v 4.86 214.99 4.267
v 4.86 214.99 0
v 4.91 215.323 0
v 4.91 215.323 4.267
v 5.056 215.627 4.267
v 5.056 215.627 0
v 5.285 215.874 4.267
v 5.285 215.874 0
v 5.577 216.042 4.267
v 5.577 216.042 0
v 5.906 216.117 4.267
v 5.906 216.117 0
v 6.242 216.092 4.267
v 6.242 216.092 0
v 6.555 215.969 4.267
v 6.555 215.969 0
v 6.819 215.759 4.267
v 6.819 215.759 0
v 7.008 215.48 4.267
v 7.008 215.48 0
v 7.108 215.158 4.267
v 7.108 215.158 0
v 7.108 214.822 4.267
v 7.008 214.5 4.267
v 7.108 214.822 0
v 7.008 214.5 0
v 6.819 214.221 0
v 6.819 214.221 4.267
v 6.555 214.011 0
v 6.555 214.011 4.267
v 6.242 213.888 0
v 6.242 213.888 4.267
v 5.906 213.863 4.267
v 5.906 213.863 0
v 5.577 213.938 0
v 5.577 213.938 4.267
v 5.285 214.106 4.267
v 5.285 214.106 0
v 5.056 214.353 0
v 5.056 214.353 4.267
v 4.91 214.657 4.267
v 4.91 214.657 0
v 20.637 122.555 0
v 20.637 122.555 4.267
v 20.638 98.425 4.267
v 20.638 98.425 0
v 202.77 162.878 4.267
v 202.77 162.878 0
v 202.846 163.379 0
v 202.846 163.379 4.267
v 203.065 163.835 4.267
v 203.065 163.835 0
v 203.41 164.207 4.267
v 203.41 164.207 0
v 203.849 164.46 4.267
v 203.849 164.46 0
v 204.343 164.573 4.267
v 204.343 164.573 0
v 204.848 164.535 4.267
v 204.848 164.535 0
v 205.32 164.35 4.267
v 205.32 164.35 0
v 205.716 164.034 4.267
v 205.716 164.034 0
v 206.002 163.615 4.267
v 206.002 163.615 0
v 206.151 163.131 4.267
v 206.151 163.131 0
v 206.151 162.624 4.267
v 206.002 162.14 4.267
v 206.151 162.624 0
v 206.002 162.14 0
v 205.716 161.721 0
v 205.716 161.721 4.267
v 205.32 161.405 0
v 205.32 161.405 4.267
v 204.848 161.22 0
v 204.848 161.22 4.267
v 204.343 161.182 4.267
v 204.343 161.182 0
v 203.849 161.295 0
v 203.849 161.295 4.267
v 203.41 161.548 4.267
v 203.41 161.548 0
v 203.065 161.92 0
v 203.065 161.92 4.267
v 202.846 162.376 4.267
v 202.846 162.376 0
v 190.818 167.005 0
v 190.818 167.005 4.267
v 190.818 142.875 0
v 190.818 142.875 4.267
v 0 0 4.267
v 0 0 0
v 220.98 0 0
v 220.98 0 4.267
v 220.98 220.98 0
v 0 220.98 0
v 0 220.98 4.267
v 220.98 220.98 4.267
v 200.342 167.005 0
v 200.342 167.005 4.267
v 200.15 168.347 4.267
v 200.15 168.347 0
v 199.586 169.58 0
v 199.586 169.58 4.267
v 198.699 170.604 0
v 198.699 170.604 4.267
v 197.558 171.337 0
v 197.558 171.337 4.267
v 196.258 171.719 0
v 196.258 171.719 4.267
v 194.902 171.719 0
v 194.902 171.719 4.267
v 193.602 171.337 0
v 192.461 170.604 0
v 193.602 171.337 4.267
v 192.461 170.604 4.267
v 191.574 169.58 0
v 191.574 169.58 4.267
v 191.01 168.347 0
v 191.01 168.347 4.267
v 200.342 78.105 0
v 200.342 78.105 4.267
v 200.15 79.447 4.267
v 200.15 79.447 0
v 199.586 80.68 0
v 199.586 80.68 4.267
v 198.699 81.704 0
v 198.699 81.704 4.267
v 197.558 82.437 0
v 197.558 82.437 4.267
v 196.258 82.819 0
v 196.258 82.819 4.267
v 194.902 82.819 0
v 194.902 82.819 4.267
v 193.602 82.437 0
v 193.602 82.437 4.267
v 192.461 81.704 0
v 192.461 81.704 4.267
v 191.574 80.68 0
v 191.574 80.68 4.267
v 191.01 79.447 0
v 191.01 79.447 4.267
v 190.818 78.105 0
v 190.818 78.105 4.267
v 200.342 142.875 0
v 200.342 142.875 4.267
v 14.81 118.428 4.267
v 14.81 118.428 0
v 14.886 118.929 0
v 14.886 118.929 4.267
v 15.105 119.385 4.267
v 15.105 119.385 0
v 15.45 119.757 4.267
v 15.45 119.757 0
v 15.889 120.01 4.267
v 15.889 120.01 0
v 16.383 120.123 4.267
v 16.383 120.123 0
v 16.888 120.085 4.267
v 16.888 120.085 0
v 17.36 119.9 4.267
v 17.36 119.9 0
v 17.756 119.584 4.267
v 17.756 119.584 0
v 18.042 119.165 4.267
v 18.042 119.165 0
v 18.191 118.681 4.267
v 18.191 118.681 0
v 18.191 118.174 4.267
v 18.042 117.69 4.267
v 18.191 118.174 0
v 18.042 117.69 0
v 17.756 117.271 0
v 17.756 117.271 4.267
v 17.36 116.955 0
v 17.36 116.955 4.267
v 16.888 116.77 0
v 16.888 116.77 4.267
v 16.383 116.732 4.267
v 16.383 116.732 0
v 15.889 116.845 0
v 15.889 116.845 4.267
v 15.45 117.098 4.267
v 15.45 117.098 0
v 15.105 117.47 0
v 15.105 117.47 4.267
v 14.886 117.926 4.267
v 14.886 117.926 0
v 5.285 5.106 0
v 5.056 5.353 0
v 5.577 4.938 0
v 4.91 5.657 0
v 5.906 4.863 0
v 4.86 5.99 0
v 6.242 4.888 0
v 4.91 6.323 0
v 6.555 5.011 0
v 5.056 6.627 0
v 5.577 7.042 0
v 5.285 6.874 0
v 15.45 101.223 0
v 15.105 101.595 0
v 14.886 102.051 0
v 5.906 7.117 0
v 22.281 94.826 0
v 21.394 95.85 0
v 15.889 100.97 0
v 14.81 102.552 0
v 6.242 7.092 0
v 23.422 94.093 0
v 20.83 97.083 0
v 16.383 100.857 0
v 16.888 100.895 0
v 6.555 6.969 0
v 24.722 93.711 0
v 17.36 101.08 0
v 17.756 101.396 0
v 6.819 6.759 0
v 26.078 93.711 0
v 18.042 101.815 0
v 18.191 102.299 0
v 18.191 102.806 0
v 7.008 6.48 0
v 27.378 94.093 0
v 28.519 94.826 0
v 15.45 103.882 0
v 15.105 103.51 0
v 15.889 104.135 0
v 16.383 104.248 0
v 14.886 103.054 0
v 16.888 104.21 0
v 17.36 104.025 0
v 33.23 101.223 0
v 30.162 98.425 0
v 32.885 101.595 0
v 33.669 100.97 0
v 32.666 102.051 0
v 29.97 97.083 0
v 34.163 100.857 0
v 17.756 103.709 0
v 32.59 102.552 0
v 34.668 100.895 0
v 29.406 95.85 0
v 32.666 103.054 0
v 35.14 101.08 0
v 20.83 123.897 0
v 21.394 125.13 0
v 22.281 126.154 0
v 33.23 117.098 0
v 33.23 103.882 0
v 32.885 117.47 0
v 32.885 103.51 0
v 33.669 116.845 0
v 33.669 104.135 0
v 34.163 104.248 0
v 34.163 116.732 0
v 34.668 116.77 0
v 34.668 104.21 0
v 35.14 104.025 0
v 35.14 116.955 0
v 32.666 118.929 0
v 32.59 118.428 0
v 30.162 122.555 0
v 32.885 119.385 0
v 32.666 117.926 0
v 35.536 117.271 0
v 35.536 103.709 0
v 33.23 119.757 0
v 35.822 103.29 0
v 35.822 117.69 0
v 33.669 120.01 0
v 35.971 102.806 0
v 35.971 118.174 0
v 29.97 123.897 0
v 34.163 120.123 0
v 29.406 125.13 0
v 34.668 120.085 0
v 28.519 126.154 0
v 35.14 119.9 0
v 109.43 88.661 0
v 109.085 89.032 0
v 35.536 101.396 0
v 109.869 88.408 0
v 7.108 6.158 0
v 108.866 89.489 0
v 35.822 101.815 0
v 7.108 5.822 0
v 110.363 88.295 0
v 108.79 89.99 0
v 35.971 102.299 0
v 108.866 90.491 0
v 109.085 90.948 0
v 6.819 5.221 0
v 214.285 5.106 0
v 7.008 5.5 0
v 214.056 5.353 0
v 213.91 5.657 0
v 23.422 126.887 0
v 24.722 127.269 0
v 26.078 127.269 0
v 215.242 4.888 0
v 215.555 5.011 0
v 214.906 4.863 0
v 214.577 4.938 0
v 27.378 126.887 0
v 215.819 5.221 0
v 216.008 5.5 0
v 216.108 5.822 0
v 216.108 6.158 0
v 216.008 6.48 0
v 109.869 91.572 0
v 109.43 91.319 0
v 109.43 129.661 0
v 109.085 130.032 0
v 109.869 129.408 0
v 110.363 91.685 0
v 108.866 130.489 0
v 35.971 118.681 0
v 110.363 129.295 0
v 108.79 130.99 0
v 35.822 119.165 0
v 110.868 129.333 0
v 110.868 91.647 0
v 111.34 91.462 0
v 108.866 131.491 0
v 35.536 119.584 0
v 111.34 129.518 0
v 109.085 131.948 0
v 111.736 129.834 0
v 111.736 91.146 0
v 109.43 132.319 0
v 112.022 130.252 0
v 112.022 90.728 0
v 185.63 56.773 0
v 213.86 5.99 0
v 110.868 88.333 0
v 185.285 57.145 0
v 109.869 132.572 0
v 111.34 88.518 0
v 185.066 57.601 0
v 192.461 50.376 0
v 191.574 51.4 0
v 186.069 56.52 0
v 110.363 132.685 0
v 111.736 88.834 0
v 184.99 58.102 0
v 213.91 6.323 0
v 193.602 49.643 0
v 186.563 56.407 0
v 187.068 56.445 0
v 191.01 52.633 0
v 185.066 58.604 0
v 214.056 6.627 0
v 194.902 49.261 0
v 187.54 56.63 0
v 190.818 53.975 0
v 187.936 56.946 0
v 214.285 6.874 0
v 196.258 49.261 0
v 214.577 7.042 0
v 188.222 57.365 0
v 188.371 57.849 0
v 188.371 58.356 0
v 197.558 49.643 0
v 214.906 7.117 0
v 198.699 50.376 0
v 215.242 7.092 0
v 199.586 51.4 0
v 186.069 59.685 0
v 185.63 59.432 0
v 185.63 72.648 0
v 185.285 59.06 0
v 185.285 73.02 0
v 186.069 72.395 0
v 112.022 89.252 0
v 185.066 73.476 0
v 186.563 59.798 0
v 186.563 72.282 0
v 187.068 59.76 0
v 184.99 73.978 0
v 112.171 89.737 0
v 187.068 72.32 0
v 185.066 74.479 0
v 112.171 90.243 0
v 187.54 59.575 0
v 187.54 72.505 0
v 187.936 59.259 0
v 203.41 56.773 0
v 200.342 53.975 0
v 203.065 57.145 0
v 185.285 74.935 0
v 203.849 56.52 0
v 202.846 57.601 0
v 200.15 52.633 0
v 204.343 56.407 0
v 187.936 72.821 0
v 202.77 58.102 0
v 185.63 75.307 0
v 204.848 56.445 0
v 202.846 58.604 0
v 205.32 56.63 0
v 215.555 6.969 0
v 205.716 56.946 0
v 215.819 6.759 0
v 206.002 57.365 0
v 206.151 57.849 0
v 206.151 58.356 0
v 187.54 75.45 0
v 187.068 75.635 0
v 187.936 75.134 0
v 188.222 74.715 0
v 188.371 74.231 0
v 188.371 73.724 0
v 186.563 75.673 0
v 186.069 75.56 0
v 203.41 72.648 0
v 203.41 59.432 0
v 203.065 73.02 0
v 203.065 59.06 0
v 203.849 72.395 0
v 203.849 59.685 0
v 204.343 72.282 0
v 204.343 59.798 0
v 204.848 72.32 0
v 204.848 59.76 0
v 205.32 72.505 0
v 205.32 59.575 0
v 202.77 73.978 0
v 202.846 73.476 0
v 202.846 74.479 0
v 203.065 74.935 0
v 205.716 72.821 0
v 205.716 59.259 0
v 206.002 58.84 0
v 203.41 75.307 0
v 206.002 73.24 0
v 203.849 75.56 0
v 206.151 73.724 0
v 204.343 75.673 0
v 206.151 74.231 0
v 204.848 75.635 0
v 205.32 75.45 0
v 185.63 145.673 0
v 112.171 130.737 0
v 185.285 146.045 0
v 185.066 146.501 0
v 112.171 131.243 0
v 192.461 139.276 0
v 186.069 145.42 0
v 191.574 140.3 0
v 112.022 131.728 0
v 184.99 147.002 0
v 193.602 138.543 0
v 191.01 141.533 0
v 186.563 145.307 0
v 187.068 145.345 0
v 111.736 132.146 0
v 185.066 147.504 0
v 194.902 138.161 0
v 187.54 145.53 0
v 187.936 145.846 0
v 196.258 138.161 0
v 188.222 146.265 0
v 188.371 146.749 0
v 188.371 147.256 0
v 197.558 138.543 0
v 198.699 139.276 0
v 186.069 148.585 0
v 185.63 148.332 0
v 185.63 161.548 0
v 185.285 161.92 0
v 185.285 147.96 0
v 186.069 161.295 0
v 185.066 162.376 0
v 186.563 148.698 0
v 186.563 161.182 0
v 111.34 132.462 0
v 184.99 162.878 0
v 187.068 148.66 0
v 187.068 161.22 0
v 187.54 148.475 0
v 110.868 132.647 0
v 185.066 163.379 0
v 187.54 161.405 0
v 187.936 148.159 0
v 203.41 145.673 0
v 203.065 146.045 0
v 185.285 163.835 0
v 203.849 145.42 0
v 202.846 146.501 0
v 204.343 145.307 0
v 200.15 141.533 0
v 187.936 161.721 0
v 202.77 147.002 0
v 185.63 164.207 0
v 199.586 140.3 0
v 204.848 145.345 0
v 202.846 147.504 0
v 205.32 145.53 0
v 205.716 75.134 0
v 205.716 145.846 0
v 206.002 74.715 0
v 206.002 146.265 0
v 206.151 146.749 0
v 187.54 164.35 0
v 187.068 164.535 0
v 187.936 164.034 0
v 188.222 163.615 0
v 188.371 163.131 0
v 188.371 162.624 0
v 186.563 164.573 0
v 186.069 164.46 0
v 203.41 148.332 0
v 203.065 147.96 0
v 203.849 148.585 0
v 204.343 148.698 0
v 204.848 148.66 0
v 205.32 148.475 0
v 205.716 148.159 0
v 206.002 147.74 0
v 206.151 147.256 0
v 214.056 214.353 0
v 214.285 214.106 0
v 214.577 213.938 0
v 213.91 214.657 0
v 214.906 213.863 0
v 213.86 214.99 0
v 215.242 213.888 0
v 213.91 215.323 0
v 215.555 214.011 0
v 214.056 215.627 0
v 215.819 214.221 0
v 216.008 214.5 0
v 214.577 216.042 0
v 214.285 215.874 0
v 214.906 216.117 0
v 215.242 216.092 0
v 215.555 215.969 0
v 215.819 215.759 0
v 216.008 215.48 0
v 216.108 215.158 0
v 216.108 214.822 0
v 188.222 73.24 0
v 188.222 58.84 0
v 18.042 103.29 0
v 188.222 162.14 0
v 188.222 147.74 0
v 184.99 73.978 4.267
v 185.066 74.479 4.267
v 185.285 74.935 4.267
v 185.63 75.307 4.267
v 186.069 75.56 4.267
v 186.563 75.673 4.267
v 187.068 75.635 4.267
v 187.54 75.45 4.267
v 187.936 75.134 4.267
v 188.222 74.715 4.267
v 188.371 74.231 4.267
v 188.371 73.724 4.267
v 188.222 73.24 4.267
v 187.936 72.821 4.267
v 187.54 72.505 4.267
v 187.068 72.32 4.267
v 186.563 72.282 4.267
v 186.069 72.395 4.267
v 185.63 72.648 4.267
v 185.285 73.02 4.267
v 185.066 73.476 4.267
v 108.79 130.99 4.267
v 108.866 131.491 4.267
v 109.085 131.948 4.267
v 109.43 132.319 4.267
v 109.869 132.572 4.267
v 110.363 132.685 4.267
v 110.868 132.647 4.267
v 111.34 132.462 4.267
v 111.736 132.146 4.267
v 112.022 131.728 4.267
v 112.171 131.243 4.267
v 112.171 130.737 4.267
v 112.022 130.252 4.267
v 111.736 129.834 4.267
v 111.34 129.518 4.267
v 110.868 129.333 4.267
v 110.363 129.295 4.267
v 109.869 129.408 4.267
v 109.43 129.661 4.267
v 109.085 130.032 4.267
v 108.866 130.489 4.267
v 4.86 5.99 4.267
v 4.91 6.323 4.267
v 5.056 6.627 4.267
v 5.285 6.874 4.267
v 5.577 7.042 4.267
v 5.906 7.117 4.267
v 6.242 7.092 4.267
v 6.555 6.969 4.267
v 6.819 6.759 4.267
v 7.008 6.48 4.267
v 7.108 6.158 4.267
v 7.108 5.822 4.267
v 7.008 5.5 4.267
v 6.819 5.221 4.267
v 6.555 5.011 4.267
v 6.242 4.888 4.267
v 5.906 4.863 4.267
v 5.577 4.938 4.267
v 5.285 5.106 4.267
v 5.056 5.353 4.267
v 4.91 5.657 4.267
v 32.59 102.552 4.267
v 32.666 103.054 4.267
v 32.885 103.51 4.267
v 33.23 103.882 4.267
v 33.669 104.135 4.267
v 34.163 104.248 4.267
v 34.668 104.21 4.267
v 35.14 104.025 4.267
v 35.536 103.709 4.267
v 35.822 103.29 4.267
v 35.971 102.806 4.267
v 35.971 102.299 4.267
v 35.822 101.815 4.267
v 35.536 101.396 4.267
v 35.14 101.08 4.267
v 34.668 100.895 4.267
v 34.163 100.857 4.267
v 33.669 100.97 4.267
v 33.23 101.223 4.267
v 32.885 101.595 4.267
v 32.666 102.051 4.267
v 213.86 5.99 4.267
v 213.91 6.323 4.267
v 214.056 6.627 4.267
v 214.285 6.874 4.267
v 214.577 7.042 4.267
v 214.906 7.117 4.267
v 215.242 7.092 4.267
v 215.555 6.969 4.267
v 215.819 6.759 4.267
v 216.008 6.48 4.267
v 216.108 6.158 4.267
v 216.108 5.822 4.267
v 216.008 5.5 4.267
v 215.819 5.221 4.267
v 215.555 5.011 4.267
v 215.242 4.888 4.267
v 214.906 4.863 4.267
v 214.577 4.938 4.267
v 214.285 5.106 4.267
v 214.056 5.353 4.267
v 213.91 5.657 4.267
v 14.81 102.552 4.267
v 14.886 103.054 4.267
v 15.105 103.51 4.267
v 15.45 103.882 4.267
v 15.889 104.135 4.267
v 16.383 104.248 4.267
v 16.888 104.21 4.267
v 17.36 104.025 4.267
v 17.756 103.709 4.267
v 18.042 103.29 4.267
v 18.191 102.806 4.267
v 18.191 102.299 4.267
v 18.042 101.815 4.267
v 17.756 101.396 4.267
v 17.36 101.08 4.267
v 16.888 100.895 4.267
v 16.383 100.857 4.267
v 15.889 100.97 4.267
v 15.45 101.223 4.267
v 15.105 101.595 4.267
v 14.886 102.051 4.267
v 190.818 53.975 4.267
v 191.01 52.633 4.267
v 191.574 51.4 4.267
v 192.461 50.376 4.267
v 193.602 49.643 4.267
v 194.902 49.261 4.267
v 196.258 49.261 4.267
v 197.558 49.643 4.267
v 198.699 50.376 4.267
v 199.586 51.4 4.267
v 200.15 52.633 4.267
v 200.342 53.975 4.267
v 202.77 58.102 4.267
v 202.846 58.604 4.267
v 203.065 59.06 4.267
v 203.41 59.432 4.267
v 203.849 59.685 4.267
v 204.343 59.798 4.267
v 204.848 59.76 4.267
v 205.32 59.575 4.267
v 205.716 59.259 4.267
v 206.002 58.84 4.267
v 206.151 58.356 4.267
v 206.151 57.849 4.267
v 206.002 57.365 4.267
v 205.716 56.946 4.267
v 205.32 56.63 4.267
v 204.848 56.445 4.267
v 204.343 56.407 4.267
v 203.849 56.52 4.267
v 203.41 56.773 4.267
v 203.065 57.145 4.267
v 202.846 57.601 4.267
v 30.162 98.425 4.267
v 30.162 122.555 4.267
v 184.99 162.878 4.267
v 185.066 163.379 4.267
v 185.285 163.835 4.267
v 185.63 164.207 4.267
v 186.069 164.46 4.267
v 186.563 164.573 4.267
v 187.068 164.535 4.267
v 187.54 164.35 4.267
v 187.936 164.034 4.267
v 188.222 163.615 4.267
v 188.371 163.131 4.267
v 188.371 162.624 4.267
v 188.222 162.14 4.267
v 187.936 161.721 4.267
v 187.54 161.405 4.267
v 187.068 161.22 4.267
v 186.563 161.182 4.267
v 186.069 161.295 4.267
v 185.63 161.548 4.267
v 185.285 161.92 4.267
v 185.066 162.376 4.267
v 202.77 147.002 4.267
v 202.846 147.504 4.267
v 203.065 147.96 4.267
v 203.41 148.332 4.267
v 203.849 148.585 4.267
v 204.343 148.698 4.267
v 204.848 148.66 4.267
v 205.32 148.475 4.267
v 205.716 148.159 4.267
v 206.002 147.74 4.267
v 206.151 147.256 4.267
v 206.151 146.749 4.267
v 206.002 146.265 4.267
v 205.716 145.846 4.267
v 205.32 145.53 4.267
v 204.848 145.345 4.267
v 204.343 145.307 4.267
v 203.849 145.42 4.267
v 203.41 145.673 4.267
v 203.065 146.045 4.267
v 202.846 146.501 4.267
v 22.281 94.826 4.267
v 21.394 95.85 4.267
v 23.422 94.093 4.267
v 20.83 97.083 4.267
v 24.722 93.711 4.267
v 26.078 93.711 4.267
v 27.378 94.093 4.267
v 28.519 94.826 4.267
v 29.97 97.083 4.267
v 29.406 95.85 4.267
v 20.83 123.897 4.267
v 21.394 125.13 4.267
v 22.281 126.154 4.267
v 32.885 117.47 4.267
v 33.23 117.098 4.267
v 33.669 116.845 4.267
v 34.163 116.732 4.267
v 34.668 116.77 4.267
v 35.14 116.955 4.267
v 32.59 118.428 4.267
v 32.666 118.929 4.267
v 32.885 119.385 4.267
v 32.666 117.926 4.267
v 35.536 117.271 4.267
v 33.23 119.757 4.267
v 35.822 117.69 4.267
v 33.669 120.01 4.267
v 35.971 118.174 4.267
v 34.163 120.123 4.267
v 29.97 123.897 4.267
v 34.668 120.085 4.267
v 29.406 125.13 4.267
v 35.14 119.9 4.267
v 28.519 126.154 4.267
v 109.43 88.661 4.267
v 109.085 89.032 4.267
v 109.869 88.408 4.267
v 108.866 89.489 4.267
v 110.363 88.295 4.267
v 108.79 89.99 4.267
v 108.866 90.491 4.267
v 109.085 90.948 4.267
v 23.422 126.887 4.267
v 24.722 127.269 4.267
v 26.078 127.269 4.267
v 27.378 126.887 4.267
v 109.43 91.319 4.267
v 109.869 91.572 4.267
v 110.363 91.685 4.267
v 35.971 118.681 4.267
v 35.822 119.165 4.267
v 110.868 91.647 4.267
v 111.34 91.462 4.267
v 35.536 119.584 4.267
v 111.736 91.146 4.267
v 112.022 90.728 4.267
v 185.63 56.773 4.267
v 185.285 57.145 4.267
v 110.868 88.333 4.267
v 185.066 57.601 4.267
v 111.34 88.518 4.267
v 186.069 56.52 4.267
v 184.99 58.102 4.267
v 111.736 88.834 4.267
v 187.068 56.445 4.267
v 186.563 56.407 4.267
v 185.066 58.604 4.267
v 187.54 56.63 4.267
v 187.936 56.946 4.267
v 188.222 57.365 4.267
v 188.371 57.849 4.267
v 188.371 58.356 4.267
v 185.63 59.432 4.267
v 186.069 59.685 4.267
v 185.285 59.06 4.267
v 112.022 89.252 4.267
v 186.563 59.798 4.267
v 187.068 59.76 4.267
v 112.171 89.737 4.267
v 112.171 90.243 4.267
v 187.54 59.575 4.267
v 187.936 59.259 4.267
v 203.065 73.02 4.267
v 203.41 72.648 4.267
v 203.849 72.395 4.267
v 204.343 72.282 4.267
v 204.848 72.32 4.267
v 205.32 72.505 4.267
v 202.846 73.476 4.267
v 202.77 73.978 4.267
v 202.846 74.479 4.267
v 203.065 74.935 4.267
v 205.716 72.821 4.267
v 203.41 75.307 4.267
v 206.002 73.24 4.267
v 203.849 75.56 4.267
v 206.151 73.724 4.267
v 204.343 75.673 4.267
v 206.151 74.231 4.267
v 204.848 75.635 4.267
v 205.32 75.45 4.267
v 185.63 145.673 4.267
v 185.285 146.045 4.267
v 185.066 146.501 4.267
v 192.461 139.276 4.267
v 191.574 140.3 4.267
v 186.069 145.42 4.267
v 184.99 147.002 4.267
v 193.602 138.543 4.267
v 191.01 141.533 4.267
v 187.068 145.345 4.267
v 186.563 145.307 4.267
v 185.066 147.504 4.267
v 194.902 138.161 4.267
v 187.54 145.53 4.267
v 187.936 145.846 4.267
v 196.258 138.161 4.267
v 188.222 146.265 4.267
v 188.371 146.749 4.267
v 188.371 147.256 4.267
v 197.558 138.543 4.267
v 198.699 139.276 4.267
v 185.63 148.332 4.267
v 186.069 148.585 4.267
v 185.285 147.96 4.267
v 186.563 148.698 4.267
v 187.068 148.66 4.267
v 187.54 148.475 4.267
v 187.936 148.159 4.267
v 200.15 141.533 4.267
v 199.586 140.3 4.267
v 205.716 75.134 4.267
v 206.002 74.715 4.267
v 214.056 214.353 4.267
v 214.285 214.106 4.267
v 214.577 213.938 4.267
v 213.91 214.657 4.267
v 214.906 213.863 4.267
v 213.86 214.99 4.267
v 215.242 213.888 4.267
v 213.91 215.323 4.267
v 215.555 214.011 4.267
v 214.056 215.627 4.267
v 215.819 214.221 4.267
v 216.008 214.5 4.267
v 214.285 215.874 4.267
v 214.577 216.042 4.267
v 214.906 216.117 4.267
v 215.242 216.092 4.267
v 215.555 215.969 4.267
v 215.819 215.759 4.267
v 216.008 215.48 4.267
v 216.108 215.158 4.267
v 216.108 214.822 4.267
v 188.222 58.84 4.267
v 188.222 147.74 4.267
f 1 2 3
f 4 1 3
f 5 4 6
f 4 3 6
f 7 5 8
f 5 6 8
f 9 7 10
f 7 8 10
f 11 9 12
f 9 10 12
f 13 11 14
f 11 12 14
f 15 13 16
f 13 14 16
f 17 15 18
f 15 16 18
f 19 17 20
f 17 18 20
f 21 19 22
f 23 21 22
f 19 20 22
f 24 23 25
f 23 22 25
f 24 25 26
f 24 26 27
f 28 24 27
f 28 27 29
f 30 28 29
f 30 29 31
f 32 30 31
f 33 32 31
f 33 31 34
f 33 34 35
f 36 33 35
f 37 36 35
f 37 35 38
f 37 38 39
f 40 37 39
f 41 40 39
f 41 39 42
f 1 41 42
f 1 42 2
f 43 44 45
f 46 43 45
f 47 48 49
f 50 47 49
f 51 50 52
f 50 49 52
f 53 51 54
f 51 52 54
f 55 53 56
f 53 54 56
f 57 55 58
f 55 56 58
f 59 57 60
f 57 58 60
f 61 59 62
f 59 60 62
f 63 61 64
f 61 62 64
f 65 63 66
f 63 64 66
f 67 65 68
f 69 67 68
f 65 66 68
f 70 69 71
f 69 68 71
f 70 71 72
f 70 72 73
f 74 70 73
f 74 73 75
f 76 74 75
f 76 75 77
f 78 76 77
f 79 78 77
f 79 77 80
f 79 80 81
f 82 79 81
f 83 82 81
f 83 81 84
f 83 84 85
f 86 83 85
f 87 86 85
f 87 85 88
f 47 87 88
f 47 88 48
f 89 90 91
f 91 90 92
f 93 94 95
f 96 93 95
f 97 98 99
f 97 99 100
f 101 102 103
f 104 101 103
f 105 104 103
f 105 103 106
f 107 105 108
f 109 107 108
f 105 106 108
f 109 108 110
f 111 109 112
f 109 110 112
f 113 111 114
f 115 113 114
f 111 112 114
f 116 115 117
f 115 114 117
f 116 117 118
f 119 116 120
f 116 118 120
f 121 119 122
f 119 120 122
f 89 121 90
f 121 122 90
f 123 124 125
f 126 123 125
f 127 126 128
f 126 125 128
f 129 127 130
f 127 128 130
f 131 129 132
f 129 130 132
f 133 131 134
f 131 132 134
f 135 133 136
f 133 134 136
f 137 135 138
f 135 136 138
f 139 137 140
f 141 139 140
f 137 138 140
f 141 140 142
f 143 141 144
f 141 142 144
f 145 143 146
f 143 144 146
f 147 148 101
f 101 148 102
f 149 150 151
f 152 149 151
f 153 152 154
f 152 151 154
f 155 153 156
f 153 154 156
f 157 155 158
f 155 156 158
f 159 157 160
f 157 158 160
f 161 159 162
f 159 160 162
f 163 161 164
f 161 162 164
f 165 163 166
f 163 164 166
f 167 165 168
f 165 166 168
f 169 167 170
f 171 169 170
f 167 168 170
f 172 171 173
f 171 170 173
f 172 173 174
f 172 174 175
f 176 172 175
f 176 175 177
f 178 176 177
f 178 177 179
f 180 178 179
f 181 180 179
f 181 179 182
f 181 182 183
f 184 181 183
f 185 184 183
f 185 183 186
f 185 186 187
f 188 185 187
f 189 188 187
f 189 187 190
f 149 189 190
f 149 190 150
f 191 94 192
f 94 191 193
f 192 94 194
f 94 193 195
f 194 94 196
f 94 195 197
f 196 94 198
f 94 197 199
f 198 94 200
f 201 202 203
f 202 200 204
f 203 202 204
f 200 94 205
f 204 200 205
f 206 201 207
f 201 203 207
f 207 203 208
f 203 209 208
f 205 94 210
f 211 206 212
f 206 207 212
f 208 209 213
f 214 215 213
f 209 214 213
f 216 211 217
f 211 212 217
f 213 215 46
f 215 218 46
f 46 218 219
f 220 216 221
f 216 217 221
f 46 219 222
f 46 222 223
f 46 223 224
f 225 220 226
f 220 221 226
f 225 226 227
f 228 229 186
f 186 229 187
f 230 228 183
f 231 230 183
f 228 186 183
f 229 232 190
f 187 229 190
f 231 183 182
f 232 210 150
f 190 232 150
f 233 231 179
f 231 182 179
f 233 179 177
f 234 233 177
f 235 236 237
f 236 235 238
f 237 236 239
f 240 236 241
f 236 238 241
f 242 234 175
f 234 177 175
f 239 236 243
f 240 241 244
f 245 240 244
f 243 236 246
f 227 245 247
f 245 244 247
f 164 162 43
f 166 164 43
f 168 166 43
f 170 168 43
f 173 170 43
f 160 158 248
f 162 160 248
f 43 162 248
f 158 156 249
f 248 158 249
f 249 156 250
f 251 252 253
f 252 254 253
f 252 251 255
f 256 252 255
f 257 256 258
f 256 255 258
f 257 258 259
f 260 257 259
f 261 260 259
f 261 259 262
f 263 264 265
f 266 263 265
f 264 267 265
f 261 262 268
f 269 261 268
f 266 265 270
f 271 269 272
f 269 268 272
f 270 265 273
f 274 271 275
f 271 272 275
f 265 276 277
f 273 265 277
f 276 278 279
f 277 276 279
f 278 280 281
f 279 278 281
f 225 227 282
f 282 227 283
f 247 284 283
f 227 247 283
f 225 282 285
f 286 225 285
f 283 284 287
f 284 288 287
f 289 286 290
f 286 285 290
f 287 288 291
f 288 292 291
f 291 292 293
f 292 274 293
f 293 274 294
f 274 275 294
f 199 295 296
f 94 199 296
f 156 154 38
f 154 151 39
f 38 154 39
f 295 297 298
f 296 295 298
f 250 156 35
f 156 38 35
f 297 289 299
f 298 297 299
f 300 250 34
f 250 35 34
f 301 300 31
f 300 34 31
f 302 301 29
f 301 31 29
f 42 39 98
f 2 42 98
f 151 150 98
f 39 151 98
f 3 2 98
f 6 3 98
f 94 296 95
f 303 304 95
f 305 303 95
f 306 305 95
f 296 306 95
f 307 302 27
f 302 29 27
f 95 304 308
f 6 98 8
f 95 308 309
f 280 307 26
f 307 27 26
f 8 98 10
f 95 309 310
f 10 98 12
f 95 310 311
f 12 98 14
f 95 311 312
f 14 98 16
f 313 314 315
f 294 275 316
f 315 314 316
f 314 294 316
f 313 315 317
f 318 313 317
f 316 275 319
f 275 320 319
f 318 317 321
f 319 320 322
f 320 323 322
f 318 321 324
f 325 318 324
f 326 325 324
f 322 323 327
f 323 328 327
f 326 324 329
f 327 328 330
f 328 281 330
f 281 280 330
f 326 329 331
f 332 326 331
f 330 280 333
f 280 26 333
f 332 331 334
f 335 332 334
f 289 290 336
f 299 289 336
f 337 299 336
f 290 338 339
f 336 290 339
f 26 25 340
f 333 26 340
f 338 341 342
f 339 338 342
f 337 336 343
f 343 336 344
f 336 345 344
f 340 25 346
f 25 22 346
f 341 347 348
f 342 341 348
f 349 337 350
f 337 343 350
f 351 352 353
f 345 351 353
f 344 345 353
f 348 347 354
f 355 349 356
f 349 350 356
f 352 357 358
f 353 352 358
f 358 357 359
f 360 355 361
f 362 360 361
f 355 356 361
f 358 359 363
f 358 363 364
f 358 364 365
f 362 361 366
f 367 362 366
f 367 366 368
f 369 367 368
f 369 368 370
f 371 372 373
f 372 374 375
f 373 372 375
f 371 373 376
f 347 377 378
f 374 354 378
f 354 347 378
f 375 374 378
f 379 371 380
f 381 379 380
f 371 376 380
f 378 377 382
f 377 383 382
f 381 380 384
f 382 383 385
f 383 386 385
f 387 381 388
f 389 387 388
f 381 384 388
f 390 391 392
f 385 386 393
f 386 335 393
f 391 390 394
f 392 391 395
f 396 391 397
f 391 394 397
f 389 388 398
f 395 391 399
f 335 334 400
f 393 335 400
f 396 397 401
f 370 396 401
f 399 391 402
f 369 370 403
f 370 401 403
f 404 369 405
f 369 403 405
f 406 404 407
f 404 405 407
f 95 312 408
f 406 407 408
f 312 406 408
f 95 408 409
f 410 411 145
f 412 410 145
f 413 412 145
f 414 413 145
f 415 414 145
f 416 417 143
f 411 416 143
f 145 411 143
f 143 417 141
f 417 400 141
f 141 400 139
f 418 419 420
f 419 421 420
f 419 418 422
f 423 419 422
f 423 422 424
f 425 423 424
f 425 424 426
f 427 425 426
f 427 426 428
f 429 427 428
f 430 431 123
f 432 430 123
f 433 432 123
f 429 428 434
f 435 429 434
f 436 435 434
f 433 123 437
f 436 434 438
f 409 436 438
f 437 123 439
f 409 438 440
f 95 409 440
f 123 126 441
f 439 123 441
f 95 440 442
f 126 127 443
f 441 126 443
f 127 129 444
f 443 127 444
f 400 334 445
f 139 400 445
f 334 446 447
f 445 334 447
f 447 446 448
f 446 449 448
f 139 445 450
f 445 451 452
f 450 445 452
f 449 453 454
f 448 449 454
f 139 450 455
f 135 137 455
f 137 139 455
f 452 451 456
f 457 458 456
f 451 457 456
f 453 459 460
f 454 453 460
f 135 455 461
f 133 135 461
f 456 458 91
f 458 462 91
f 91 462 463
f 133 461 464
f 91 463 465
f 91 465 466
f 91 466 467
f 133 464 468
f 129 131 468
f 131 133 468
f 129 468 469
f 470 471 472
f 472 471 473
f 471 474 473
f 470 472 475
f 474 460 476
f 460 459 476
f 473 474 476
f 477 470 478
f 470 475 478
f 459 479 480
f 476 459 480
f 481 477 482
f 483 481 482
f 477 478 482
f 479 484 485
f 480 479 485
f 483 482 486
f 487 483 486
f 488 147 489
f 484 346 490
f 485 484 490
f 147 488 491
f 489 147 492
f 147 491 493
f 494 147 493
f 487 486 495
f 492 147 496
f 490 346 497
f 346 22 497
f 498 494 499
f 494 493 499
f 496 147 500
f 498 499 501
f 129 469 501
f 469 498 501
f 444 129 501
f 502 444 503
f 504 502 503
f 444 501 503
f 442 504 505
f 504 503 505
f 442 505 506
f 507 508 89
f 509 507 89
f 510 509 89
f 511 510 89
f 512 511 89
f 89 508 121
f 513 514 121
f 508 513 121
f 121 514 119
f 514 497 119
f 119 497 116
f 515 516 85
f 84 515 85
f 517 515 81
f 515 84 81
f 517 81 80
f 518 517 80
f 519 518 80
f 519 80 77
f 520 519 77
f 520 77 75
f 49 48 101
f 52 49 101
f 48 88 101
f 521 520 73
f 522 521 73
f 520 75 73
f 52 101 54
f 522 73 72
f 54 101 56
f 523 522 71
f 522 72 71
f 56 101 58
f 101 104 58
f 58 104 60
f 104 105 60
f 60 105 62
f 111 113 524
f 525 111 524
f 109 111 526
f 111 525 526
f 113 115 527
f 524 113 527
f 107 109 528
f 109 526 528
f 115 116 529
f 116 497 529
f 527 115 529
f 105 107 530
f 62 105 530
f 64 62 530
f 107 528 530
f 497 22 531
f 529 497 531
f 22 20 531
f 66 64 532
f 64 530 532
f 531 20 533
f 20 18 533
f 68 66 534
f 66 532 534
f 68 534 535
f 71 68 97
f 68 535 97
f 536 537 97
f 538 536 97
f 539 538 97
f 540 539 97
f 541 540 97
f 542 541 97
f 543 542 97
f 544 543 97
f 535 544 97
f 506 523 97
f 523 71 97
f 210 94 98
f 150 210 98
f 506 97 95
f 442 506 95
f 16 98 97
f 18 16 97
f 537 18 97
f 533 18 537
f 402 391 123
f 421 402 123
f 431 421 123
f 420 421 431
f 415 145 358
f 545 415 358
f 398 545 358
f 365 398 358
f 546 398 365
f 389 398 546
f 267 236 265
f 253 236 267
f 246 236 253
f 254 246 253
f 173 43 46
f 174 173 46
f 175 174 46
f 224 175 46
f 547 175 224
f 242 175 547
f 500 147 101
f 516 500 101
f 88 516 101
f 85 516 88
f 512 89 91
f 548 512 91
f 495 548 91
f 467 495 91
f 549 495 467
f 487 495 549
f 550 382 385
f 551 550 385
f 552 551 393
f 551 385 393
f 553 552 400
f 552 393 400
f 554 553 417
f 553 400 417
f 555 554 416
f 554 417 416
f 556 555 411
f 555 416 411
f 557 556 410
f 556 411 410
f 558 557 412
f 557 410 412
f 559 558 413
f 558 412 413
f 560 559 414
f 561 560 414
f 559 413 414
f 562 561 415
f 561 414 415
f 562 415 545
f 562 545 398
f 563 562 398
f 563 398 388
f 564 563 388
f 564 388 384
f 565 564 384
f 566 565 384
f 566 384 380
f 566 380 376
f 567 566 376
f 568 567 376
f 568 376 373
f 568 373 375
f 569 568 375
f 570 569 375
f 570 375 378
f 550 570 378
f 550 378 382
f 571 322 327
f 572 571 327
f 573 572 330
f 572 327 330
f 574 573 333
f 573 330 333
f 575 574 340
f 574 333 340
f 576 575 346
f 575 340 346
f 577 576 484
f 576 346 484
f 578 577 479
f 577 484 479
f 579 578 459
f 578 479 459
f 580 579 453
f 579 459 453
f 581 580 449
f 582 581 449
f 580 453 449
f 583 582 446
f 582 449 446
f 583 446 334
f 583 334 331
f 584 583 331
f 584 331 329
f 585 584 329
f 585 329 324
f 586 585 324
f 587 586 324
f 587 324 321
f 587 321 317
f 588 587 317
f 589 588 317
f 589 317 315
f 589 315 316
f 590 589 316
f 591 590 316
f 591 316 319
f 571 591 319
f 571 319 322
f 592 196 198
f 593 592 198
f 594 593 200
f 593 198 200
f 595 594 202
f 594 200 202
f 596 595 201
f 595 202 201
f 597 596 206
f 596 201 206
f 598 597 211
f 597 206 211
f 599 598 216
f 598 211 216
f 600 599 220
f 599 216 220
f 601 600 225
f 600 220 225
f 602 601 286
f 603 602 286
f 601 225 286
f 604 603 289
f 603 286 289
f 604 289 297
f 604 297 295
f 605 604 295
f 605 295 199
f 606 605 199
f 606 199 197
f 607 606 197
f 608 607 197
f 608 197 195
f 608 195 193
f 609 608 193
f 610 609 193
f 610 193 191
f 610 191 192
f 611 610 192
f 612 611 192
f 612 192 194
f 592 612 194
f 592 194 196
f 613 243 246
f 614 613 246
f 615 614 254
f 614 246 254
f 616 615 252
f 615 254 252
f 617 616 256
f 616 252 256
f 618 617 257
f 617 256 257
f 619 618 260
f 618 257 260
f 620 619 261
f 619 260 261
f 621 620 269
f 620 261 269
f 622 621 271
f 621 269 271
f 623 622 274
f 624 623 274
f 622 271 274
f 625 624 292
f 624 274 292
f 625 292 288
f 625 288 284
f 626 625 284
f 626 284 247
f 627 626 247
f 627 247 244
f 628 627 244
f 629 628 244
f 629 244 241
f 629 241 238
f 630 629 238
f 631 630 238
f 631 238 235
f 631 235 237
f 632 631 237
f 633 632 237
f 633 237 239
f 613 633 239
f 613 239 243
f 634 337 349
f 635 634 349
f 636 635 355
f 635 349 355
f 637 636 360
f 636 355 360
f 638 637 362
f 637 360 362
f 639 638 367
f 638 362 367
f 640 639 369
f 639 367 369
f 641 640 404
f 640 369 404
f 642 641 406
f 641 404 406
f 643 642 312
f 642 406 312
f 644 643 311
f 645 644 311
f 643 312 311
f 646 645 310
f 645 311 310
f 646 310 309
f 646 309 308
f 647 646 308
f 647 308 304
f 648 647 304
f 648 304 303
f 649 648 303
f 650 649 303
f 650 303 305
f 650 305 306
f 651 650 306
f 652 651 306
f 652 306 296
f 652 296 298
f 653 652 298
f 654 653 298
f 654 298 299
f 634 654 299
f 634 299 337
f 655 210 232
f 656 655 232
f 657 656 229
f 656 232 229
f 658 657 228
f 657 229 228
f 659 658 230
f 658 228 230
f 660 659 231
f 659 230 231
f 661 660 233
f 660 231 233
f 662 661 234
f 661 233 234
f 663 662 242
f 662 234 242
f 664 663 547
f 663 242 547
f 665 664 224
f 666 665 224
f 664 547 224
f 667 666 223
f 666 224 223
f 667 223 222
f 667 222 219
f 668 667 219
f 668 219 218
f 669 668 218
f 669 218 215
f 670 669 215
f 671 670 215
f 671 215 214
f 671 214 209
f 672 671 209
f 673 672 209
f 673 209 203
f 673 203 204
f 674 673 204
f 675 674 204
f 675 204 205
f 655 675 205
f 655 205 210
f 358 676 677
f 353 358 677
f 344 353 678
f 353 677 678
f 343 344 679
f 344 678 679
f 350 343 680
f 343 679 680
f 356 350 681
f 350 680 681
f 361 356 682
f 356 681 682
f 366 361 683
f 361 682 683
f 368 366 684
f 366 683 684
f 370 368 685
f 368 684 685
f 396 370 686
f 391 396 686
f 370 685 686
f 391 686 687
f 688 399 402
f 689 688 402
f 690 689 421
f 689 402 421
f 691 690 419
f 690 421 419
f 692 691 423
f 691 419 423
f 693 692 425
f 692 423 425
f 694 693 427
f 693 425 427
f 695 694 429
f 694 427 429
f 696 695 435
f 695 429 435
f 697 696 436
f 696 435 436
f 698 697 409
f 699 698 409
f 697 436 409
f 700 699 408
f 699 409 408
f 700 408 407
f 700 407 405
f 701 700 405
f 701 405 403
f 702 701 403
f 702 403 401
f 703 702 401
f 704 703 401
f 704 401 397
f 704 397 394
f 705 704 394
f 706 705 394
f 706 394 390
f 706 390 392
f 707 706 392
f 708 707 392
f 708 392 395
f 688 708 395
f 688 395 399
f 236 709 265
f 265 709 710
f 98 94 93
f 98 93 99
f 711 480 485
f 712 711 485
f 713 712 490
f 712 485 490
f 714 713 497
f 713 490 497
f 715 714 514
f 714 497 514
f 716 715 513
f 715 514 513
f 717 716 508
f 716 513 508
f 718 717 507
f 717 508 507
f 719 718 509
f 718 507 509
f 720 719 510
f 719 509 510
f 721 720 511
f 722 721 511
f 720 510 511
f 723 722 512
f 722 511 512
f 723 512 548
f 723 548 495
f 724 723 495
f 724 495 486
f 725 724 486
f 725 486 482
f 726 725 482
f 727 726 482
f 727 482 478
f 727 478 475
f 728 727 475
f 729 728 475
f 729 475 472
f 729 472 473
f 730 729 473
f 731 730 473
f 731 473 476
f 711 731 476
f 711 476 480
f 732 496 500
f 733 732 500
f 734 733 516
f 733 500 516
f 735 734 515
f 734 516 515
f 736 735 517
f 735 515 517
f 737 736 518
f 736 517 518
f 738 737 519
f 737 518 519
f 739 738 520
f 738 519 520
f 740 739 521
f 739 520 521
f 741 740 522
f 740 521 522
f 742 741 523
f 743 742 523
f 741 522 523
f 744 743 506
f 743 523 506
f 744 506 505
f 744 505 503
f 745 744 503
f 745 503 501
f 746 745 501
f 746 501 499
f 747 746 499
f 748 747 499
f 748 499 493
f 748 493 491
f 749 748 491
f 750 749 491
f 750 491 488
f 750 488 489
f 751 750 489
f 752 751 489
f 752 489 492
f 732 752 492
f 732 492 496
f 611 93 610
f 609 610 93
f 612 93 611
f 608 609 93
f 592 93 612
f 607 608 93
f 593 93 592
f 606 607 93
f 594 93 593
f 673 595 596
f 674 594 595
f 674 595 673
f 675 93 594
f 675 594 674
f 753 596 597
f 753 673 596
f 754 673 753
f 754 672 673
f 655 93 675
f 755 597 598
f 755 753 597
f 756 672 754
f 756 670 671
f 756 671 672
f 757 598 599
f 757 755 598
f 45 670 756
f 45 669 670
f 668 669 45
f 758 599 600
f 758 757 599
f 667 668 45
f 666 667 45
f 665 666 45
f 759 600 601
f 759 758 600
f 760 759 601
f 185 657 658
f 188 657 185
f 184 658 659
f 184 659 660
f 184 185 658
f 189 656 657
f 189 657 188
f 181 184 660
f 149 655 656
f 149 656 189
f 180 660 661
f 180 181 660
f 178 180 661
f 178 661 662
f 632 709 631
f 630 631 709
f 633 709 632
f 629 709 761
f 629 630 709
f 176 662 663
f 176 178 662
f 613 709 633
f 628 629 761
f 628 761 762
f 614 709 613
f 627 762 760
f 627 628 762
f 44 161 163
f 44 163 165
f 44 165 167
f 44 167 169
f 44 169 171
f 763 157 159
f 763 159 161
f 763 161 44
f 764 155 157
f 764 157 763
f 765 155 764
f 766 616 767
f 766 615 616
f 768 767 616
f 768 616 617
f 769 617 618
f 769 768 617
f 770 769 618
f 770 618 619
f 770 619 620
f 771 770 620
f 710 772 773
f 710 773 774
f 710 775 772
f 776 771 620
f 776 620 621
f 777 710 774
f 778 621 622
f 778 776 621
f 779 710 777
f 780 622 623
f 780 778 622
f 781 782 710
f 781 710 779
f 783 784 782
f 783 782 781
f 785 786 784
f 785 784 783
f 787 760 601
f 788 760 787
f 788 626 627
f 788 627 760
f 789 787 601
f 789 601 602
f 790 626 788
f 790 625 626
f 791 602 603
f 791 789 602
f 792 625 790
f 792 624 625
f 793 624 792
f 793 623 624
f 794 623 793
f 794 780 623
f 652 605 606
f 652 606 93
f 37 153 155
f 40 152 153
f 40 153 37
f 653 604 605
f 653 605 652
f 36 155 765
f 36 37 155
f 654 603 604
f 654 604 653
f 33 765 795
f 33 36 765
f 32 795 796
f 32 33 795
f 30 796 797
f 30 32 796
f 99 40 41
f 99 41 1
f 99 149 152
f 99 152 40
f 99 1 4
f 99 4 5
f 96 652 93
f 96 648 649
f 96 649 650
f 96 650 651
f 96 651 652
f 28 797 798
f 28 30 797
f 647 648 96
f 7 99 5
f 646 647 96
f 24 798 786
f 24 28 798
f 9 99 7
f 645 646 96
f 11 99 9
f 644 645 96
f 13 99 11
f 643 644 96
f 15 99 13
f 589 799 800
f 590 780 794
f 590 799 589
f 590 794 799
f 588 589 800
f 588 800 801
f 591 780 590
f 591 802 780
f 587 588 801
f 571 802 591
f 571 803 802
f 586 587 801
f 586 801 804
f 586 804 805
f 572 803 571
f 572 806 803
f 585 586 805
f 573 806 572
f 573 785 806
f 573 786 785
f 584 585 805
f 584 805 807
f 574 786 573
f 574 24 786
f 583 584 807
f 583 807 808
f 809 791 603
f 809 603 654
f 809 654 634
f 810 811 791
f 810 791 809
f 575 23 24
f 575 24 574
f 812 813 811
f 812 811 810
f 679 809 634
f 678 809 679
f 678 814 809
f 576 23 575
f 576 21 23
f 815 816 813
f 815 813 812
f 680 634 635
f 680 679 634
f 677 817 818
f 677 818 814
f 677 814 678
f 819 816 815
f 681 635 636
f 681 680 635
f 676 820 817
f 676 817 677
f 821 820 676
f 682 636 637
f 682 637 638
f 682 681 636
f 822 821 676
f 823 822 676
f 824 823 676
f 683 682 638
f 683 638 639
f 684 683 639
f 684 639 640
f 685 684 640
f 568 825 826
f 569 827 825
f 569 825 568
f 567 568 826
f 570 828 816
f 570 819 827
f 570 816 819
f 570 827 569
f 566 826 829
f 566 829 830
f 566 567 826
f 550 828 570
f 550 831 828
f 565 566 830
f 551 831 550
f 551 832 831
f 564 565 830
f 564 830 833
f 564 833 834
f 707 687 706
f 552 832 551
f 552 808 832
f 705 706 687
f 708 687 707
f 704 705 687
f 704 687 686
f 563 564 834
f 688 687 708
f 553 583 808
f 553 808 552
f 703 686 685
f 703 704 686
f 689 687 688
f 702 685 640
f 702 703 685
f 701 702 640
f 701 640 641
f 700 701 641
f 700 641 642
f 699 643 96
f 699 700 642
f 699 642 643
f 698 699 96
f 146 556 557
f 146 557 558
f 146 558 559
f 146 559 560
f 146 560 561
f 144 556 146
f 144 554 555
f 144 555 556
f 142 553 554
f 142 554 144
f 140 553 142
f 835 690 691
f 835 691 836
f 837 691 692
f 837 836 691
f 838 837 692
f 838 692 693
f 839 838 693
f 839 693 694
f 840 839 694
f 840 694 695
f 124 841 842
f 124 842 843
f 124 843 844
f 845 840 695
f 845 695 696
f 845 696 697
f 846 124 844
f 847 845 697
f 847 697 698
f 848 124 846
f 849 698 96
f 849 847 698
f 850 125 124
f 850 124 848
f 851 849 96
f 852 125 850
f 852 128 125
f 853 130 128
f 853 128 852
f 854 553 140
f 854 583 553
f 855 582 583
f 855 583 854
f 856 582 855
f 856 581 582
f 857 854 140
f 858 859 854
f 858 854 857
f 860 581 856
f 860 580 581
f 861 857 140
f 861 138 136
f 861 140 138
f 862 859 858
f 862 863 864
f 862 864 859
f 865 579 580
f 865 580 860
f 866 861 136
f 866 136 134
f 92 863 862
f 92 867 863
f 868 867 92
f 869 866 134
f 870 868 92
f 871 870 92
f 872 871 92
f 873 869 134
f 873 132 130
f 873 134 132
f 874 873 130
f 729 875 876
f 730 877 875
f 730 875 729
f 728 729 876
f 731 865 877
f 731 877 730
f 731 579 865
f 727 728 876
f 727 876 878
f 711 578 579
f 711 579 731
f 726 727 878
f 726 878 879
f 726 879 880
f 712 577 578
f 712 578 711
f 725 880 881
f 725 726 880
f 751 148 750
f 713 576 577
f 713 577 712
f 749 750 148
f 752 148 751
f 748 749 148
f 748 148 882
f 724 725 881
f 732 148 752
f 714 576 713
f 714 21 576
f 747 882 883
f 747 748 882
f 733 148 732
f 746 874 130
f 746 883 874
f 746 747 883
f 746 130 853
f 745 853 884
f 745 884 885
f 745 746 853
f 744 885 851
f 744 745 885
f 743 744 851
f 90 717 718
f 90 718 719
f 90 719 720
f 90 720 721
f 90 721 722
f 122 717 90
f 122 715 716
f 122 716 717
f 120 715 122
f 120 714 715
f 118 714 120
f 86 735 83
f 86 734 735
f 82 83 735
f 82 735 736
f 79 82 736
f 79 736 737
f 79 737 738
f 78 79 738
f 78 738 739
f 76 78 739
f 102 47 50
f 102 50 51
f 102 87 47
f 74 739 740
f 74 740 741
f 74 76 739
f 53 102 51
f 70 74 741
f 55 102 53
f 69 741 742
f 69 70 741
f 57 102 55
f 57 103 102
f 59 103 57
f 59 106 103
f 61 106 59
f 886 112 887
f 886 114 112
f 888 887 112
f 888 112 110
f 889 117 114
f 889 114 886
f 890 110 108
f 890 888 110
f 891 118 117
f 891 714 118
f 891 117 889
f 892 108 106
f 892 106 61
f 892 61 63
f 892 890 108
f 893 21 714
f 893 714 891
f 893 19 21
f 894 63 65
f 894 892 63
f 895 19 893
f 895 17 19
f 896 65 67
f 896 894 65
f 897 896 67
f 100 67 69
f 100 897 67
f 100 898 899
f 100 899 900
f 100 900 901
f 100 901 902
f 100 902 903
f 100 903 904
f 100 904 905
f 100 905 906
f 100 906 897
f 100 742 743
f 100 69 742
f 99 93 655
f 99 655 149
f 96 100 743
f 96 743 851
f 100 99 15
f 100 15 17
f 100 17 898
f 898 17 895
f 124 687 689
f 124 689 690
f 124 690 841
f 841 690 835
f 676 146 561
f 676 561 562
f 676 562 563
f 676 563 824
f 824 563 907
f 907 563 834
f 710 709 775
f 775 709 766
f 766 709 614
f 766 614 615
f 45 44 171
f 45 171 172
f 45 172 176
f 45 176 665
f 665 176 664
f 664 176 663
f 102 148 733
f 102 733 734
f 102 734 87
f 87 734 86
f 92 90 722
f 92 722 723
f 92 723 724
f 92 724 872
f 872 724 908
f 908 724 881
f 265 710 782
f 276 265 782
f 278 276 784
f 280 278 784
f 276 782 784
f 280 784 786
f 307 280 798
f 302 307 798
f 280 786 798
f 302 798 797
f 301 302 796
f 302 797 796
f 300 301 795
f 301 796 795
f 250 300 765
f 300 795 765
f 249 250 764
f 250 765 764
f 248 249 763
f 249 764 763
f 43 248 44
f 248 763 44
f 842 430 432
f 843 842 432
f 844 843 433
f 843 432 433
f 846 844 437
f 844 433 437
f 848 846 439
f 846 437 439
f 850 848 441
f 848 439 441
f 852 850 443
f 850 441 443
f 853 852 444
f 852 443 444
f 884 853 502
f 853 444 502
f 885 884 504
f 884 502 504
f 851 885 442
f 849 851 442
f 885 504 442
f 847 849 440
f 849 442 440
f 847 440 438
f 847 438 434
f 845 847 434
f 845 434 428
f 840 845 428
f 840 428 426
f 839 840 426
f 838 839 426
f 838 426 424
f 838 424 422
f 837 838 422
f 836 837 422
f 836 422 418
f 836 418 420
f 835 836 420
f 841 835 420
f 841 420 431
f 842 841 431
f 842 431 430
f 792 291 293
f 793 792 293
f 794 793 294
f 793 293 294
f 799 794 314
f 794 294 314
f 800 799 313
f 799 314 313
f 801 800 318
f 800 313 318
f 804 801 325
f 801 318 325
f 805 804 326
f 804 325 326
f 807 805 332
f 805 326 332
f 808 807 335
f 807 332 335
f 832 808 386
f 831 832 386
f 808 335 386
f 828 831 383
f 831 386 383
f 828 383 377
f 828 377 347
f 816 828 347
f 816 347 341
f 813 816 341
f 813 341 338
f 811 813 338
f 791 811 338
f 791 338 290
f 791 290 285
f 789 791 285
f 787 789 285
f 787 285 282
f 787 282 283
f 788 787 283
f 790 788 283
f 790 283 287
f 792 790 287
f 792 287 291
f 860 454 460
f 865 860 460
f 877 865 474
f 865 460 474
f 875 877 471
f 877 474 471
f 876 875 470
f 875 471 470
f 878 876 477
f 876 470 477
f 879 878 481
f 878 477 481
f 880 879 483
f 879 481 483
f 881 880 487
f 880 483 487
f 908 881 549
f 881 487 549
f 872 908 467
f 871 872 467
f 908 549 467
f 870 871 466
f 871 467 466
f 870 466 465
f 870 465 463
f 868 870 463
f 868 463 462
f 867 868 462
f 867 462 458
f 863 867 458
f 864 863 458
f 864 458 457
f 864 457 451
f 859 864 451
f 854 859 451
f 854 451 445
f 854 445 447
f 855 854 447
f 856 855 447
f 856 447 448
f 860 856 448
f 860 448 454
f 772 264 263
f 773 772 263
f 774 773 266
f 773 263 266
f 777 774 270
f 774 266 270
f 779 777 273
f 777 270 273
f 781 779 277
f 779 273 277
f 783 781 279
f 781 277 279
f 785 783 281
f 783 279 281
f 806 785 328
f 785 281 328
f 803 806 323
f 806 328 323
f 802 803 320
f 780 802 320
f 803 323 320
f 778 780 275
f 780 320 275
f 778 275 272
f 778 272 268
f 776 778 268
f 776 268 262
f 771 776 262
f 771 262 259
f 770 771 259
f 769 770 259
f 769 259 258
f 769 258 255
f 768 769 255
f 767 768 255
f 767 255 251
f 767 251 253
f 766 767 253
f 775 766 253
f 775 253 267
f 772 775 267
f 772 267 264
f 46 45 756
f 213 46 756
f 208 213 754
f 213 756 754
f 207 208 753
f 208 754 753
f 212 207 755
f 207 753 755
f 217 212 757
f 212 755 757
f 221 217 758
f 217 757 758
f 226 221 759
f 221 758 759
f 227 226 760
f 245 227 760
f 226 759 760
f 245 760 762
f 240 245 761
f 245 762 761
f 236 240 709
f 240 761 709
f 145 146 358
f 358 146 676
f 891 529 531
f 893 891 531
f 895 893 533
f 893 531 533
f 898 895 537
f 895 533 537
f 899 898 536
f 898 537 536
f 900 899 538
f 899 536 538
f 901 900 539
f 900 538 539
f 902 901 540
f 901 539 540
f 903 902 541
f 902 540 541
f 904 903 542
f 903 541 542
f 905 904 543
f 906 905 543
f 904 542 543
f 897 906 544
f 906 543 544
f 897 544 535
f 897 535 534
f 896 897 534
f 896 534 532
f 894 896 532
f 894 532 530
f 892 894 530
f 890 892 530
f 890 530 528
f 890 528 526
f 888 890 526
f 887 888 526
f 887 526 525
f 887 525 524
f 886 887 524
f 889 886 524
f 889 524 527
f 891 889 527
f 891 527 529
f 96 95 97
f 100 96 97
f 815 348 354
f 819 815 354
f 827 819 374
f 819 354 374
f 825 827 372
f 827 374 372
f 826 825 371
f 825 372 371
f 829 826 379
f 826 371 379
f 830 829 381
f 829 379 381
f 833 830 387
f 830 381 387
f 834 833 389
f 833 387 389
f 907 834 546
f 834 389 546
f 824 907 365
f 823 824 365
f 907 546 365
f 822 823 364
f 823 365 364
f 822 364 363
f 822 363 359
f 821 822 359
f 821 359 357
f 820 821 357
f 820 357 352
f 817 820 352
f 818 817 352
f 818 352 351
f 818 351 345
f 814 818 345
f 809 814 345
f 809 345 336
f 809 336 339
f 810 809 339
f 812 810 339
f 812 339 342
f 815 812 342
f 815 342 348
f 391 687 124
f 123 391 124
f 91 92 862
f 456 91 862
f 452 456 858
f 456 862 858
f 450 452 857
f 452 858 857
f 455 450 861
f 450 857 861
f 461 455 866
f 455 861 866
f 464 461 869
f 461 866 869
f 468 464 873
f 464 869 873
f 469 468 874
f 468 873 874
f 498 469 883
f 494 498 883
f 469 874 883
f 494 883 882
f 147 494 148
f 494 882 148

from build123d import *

# Parameters (mm, degrees)
F0_W     = 220.98
F0_H     = 220.98
F1_DEPTH = 4.2672
F3_D     = 2.2606
F5_DEPTH = 4.2682
F7_D     = 3.4
F9_D     = 3.4


with BuildPart() as f1:
    # F0 (on Top) → F1 (new body)
    with BuildSketch(Plane.XY):
        with Locations((110.49, 110.49)):
            Rectangle(F0_W, F0_H)
    extrude(amount=F1_DEPTH)

    # F3 (through all)
    with Locations(Plane.XY.offset(4.2672)):
        with Locations((5.99, 214.99), (214.99, 214.99), (214.99, 5.99), (5.99, 5.99)):
            Hole(F3_D / 2)

    # F4 (on face) → F5 (cut, through all)
    with BuildSketch(Plane.XY.offset(4.2672)):
        with BuildLine():
            ThreePointArc((30.1625, 122.555), (25.4, 127.3175), (20.6375, 122.555))
            Line((20.6375, 122.555), (20.6375, 98.425))
            ThreePointArc((20.6375, 98.425), (25.4, 93.6625), (30.1625, 98.425))
            Line((30.1625, 98.425), (30.1625, 122.555))
        make_face()
        with BuildLine():
            ThreePointArc((200.3425, 78.105), (195.58, 82.8675), (190.8175, 78.105))
            Line((190.8175, 78.105), (190.8175, 53.975))
            ThreePointArc((190.8175, 53.975), (195.58, 49.2125), (200.3425, 53.975))
            Line((200.3425, 53.975), (200.3425, 78.105))
        make_face()
        with BuildLine():
            Line((200.3425, 142.875), (200.3425, 167.005))
            ThreePointArc((200.3425, 167.005), (195.58, 171.7675), (190.8175, 167.005))
            Line((190.8175, 167.005), (190.8175, 142.875))
            ThreePointArc((190.8175, 142.875), (195.58, 138.1125), (200.3425, 142.875))
        make_face()
    extrude(amount=-F5_DEPTH, mode=Mode.SUBTRACT)

    # F7 (through all)
    with Locations(Plane.XY.offset(4.2672)):
        with Locations((110.49, 130.99), (110.49, 89.99)):
            Hole(F7_D / 2)

    # F9 (through all)
    with Locations(Plane.XY.offset(4.2672)):
        with Locations((16.51, 118.4275), (16.51, 102.5525), (34.29, 118.4275), (34.29, 102.5525), (204.47, 162.8775), (186.69, 147.0025), (186.69, 162.8775), (204.47, 147.0025), (204.47, 73.9775), (186.69, 58.1025), (204.47, 58.1025), (186.69, 73.9775)):
            Hole(F9_D / 2)


solid = f1.part
